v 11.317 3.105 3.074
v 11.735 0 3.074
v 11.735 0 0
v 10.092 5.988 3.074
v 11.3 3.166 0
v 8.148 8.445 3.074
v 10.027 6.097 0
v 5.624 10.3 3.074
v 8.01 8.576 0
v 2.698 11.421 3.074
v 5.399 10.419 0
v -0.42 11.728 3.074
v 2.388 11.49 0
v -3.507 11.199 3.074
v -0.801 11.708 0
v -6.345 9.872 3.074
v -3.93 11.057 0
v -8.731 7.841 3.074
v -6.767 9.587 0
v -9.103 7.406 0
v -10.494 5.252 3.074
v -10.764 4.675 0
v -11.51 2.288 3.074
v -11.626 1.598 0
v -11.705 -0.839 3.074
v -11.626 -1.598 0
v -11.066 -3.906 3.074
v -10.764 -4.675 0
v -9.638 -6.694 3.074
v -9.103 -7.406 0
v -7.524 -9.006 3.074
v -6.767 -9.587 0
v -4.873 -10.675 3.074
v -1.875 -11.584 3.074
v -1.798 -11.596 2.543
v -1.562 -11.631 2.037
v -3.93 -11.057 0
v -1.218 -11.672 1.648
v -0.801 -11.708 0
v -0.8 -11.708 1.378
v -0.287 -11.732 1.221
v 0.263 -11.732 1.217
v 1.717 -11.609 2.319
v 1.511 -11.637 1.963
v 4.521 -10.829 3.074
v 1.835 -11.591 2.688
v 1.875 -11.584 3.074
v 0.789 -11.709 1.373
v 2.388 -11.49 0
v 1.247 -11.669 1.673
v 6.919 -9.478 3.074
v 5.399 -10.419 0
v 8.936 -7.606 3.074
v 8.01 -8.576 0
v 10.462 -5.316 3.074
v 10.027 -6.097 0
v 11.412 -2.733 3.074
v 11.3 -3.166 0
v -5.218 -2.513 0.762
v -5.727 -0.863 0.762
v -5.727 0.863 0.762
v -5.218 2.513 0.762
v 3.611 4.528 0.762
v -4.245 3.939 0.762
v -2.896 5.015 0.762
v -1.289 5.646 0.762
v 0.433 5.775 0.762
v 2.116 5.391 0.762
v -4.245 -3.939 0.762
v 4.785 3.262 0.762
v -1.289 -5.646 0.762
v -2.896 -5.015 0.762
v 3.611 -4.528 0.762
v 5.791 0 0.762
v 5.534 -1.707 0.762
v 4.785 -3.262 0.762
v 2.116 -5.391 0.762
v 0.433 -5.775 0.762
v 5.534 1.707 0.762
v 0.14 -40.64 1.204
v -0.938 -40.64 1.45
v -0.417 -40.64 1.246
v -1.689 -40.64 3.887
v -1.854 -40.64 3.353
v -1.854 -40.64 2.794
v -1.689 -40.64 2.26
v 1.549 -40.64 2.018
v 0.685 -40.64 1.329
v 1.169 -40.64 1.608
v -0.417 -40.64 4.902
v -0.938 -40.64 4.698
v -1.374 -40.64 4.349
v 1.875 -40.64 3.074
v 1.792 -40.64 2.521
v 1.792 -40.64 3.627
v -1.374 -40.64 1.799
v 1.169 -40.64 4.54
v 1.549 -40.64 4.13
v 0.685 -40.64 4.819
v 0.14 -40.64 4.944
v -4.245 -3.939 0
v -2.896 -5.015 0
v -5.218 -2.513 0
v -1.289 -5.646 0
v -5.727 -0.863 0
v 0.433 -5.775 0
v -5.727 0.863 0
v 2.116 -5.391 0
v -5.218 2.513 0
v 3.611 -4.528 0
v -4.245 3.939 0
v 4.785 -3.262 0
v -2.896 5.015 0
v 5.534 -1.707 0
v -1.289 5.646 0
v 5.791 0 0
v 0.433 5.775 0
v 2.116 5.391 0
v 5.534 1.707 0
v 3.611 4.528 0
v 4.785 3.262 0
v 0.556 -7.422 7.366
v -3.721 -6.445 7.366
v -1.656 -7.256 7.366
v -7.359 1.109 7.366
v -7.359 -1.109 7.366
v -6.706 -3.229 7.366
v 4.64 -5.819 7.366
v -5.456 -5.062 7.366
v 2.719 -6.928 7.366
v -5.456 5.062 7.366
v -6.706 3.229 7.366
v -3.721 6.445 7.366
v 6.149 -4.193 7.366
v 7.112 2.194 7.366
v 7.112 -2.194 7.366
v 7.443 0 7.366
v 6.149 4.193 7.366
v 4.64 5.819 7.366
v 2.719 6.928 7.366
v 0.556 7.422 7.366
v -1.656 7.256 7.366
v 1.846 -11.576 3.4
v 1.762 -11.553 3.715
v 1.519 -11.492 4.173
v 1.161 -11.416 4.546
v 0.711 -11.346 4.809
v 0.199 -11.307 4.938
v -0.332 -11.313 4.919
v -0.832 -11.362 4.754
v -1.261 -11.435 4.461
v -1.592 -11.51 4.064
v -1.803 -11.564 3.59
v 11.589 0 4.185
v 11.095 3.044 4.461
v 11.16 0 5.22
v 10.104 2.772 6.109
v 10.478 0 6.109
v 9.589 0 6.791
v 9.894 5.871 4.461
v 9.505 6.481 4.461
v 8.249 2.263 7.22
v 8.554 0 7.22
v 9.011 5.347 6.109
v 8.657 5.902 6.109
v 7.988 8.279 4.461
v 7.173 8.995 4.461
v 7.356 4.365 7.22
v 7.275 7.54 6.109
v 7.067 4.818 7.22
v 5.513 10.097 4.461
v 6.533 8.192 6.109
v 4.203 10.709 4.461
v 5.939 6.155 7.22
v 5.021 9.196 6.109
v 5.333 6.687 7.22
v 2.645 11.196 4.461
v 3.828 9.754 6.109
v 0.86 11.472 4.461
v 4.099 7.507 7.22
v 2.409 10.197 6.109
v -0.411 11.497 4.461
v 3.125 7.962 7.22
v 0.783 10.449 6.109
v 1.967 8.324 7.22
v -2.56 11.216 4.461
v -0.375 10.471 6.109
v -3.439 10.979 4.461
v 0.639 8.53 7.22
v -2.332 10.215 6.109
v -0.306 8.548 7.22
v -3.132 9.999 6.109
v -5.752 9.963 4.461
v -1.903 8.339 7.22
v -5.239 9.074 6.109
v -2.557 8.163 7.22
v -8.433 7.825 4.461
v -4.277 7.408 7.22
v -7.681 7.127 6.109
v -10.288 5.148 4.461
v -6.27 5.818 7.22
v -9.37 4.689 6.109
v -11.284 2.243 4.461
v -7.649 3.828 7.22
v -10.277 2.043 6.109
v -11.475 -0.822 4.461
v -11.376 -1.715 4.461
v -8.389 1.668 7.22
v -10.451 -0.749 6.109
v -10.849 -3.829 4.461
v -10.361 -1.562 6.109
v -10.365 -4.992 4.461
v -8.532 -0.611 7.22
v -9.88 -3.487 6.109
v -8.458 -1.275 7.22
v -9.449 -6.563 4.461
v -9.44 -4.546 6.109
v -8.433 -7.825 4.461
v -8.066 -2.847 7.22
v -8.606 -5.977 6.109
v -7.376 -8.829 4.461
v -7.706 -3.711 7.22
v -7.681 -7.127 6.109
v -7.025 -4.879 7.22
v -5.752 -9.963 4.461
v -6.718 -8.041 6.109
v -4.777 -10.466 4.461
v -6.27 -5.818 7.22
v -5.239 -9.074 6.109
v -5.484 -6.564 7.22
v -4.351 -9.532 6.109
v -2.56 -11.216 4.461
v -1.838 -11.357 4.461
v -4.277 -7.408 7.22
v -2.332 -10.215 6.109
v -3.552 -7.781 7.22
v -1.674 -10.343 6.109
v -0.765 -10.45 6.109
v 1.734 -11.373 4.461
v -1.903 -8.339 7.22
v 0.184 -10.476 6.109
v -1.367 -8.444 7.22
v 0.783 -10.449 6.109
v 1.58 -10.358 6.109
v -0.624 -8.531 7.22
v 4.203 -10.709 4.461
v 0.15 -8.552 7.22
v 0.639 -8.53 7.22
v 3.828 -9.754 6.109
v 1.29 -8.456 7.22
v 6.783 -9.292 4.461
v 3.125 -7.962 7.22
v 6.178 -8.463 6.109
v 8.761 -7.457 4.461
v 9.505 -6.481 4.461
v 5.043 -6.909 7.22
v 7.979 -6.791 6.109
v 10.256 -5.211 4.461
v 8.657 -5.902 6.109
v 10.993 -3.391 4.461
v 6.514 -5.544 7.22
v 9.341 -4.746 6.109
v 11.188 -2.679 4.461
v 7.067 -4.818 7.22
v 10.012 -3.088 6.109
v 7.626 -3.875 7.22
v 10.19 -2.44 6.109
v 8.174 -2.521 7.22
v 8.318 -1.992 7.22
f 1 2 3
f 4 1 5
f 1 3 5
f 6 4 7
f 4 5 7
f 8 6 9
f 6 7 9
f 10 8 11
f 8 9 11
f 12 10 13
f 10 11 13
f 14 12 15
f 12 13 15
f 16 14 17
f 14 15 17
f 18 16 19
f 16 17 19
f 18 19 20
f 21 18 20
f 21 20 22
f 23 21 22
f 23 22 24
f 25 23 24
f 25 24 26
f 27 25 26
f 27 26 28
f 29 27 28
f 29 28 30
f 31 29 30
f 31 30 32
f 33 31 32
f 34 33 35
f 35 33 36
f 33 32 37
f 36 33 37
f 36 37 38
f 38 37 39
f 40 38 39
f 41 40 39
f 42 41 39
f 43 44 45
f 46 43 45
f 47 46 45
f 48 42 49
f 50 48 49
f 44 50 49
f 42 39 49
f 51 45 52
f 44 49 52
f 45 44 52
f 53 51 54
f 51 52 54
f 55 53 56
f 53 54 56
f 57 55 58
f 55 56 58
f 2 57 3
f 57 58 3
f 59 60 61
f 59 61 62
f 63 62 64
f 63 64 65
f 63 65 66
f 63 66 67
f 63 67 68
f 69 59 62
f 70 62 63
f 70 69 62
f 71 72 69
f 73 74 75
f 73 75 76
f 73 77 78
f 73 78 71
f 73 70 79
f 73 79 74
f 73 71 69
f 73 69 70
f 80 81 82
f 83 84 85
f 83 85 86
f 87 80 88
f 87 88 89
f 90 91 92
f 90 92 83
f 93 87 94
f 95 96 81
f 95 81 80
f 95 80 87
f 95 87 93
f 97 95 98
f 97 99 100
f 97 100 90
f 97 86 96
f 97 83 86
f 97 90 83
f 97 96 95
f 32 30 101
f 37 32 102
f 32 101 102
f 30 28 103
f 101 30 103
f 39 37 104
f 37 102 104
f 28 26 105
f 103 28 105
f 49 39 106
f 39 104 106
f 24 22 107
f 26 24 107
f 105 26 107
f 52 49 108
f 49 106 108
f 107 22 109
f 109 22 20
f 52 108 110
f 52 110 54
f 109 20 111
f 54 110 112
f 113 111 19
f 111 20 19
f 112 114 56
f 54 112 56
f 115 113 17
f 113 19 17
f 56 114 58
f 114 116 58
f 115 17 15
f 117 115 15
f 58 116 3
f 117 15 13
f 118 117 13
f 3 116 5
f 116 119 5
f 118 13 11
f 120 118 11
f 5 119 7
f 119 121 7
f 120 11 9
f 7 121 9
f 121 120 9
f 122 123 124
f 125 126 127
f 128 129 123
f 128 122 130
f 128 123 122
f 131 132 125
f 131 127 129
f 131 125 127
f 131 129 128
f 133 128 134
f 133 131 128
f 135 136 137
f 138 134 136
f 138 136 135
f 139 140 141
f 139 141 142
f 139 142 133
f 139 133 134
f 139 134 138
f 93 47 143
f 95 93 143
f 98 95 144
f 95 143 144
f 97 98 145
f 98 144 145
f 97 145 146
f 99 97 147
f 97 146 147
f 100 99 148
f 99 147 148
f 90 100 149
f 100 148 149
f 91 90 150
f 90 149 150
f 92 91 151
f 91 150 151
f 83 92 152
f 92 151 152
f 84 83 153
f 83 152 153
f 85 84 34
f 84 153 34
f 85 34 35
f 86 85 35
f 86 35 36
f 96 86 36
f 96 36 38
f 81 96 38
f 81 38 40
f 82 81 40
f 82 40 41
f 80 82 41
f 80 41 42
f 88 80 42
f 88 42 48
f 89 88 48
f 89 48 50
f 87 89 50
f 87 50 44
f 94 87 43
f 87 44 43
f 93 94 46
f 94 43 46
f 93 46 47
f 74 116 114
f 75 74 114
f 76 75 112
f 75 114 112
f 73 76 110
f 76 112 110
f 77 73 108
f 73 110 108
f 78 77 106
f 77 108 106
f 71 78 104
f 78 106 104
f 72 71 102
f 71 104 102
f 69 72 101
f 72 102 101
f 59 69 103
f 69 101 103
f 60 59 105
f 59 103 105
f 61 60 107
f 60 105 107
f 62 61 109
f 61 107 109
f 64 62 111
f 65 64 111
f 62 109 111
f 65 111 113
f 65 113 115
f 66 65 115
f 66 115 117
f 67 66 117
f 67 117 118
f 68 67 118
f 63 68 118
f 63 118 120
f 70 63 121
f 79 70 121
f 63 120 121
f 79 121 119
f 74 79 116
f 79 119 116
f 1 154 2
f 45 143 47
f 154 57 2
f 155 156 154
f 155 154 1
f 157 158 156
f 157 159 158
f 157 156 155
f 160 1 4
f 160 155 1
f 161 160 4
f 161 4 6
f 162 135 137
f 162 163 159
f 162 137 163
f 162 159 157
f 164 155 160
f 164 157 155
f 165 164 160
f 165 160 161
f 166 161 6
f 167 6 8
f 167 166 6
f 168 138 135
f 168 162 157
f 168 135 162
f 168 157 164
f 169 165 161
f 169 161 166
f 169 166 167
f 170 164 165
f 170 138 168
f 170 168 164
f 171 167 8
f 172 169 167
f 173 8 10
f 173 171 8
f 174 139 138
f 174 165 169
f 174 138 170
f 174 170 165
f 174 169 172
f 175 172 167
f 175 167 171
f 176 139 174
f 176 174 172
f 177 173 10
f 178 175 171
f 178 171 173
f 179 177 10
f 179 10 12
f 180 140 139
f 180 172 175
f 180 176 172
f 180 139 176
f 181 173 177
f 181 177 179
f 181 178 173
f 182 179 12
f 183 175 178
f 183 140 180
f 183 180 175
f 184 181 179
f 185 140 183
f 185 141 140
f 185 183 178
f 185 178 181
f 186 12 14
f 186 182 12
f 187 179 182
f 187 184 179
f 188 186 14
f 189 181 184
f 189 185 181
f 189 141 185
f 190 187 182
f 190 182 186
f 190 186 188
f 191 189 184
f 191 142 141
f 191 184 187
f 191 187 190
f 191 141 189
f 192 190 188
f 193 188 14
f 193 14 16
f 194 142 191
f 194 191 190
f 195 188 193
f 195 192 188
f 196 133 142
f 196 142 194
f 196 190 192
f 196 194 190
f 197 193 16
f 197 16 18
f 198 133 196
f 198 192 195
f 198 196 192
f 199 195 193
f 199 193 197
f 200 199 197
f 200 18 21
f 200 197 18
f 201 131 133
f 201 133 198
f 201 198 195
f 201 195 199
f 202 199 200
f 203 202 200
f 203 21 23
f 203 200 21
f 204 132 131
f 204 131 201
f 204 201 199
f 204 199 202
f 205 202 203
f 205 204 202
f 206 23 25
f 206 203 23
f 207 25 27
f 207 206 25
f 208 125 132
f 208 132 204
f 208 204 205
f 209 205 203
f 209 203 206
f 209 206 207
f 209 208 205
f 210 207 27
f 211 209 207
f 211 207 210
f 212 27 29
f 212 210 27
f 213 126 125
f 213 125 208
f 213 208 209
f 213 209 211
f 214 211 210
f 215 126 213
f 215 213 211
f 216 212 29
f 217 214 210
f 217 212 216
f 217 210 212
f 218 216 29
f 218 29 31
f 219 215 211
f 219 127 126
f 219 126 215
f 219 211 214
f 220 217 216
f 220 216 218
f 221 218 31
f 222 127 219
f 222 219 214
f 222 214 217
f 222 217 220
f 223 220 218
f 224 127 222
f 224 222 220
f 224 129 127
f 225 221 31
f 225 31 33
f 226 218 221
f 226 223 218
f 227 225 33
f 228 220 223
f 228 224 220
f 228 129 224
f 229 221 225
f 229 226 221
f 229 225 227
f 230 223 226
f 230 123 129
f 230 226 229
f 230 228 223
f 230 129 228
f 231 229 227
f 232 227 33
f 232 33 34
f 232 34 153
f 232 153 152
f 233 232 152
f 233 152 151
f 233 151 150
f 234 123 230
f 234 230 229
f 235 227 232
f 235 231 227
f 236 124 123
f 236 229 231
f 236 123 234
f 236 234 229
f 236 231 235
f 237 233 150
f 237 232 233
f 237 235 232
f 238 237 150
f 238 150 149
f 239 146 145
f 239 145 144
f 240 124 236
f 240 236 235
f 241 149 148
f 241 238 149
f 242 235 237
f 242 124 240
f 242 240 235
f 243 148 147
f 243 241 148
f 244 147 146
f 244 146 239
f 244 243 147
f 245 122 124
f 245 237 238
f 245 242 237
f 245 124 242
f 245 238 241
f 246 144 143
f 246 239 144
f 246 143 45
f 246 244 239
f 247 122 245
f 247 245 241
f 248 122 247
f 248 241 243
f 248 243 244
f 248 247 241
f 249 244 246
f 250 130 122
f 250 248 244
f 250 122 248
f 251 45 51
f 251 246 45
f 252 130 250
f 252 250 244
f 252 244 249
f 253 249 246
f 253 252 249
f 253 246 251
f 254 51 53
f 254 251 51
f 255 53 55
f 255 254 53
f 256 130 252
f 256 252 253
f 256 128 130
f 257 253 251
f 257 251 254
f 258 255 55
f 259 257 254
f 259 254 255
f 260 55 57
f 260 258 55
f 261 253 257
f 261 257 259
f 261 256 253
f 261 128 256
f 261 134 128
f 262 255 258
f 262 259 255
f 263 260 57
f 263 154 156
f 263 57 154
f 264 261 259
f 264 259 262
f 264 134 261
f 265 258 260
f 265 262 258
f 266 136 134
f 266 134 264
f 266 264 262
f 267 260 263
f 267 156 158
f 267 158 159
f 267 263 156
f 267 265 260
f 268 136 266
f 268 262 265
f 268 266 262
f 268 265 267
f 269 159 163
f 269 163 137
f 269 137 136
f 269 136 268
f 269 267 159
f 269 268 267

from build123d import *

# Parameters (mm, degrees)
F0_R     = 11.735047
F1_DEPTH = 7.366
F2_R     = 4.292472
F3_R     = 5.7912
F4_DEPTH = 0.762
F5_R     = 1.875011
F6_DEPTH = 40.64


with BuildPart() as f1:
    # F0 (on Top) → F1 (new body)
    with BuildSketch(Plane.XY):
        Circle(F0_R)
    extrude(amount=F1_DEPTH)

    # F2
    f2_edges = [f1.edges().sort_by_distance(p)[0] for p in [
        (-11.735047, 0, 7.366),
    ]]
    fillet(f2_edges, radius=F2_R)

    # F3 (on face) → F4 (cut)
    with BuildSketch(Plane(origin=(0, 0, 0), x_dir=(1, 0, 0), z_dir=(0, 0, -1))):
        Circle(F3_R)
    extrude(amount=-F4_DEPTH, mode=Mode.SUBTRACT)

    # F5 (on Front) → F6 (join)
    with BuildSketch(Plane.XZ):
        with Locations((0, 3.073911)):
            Circle(F5_R)
    extrude(amount=F6_DEPTH)


solid = f1.part
